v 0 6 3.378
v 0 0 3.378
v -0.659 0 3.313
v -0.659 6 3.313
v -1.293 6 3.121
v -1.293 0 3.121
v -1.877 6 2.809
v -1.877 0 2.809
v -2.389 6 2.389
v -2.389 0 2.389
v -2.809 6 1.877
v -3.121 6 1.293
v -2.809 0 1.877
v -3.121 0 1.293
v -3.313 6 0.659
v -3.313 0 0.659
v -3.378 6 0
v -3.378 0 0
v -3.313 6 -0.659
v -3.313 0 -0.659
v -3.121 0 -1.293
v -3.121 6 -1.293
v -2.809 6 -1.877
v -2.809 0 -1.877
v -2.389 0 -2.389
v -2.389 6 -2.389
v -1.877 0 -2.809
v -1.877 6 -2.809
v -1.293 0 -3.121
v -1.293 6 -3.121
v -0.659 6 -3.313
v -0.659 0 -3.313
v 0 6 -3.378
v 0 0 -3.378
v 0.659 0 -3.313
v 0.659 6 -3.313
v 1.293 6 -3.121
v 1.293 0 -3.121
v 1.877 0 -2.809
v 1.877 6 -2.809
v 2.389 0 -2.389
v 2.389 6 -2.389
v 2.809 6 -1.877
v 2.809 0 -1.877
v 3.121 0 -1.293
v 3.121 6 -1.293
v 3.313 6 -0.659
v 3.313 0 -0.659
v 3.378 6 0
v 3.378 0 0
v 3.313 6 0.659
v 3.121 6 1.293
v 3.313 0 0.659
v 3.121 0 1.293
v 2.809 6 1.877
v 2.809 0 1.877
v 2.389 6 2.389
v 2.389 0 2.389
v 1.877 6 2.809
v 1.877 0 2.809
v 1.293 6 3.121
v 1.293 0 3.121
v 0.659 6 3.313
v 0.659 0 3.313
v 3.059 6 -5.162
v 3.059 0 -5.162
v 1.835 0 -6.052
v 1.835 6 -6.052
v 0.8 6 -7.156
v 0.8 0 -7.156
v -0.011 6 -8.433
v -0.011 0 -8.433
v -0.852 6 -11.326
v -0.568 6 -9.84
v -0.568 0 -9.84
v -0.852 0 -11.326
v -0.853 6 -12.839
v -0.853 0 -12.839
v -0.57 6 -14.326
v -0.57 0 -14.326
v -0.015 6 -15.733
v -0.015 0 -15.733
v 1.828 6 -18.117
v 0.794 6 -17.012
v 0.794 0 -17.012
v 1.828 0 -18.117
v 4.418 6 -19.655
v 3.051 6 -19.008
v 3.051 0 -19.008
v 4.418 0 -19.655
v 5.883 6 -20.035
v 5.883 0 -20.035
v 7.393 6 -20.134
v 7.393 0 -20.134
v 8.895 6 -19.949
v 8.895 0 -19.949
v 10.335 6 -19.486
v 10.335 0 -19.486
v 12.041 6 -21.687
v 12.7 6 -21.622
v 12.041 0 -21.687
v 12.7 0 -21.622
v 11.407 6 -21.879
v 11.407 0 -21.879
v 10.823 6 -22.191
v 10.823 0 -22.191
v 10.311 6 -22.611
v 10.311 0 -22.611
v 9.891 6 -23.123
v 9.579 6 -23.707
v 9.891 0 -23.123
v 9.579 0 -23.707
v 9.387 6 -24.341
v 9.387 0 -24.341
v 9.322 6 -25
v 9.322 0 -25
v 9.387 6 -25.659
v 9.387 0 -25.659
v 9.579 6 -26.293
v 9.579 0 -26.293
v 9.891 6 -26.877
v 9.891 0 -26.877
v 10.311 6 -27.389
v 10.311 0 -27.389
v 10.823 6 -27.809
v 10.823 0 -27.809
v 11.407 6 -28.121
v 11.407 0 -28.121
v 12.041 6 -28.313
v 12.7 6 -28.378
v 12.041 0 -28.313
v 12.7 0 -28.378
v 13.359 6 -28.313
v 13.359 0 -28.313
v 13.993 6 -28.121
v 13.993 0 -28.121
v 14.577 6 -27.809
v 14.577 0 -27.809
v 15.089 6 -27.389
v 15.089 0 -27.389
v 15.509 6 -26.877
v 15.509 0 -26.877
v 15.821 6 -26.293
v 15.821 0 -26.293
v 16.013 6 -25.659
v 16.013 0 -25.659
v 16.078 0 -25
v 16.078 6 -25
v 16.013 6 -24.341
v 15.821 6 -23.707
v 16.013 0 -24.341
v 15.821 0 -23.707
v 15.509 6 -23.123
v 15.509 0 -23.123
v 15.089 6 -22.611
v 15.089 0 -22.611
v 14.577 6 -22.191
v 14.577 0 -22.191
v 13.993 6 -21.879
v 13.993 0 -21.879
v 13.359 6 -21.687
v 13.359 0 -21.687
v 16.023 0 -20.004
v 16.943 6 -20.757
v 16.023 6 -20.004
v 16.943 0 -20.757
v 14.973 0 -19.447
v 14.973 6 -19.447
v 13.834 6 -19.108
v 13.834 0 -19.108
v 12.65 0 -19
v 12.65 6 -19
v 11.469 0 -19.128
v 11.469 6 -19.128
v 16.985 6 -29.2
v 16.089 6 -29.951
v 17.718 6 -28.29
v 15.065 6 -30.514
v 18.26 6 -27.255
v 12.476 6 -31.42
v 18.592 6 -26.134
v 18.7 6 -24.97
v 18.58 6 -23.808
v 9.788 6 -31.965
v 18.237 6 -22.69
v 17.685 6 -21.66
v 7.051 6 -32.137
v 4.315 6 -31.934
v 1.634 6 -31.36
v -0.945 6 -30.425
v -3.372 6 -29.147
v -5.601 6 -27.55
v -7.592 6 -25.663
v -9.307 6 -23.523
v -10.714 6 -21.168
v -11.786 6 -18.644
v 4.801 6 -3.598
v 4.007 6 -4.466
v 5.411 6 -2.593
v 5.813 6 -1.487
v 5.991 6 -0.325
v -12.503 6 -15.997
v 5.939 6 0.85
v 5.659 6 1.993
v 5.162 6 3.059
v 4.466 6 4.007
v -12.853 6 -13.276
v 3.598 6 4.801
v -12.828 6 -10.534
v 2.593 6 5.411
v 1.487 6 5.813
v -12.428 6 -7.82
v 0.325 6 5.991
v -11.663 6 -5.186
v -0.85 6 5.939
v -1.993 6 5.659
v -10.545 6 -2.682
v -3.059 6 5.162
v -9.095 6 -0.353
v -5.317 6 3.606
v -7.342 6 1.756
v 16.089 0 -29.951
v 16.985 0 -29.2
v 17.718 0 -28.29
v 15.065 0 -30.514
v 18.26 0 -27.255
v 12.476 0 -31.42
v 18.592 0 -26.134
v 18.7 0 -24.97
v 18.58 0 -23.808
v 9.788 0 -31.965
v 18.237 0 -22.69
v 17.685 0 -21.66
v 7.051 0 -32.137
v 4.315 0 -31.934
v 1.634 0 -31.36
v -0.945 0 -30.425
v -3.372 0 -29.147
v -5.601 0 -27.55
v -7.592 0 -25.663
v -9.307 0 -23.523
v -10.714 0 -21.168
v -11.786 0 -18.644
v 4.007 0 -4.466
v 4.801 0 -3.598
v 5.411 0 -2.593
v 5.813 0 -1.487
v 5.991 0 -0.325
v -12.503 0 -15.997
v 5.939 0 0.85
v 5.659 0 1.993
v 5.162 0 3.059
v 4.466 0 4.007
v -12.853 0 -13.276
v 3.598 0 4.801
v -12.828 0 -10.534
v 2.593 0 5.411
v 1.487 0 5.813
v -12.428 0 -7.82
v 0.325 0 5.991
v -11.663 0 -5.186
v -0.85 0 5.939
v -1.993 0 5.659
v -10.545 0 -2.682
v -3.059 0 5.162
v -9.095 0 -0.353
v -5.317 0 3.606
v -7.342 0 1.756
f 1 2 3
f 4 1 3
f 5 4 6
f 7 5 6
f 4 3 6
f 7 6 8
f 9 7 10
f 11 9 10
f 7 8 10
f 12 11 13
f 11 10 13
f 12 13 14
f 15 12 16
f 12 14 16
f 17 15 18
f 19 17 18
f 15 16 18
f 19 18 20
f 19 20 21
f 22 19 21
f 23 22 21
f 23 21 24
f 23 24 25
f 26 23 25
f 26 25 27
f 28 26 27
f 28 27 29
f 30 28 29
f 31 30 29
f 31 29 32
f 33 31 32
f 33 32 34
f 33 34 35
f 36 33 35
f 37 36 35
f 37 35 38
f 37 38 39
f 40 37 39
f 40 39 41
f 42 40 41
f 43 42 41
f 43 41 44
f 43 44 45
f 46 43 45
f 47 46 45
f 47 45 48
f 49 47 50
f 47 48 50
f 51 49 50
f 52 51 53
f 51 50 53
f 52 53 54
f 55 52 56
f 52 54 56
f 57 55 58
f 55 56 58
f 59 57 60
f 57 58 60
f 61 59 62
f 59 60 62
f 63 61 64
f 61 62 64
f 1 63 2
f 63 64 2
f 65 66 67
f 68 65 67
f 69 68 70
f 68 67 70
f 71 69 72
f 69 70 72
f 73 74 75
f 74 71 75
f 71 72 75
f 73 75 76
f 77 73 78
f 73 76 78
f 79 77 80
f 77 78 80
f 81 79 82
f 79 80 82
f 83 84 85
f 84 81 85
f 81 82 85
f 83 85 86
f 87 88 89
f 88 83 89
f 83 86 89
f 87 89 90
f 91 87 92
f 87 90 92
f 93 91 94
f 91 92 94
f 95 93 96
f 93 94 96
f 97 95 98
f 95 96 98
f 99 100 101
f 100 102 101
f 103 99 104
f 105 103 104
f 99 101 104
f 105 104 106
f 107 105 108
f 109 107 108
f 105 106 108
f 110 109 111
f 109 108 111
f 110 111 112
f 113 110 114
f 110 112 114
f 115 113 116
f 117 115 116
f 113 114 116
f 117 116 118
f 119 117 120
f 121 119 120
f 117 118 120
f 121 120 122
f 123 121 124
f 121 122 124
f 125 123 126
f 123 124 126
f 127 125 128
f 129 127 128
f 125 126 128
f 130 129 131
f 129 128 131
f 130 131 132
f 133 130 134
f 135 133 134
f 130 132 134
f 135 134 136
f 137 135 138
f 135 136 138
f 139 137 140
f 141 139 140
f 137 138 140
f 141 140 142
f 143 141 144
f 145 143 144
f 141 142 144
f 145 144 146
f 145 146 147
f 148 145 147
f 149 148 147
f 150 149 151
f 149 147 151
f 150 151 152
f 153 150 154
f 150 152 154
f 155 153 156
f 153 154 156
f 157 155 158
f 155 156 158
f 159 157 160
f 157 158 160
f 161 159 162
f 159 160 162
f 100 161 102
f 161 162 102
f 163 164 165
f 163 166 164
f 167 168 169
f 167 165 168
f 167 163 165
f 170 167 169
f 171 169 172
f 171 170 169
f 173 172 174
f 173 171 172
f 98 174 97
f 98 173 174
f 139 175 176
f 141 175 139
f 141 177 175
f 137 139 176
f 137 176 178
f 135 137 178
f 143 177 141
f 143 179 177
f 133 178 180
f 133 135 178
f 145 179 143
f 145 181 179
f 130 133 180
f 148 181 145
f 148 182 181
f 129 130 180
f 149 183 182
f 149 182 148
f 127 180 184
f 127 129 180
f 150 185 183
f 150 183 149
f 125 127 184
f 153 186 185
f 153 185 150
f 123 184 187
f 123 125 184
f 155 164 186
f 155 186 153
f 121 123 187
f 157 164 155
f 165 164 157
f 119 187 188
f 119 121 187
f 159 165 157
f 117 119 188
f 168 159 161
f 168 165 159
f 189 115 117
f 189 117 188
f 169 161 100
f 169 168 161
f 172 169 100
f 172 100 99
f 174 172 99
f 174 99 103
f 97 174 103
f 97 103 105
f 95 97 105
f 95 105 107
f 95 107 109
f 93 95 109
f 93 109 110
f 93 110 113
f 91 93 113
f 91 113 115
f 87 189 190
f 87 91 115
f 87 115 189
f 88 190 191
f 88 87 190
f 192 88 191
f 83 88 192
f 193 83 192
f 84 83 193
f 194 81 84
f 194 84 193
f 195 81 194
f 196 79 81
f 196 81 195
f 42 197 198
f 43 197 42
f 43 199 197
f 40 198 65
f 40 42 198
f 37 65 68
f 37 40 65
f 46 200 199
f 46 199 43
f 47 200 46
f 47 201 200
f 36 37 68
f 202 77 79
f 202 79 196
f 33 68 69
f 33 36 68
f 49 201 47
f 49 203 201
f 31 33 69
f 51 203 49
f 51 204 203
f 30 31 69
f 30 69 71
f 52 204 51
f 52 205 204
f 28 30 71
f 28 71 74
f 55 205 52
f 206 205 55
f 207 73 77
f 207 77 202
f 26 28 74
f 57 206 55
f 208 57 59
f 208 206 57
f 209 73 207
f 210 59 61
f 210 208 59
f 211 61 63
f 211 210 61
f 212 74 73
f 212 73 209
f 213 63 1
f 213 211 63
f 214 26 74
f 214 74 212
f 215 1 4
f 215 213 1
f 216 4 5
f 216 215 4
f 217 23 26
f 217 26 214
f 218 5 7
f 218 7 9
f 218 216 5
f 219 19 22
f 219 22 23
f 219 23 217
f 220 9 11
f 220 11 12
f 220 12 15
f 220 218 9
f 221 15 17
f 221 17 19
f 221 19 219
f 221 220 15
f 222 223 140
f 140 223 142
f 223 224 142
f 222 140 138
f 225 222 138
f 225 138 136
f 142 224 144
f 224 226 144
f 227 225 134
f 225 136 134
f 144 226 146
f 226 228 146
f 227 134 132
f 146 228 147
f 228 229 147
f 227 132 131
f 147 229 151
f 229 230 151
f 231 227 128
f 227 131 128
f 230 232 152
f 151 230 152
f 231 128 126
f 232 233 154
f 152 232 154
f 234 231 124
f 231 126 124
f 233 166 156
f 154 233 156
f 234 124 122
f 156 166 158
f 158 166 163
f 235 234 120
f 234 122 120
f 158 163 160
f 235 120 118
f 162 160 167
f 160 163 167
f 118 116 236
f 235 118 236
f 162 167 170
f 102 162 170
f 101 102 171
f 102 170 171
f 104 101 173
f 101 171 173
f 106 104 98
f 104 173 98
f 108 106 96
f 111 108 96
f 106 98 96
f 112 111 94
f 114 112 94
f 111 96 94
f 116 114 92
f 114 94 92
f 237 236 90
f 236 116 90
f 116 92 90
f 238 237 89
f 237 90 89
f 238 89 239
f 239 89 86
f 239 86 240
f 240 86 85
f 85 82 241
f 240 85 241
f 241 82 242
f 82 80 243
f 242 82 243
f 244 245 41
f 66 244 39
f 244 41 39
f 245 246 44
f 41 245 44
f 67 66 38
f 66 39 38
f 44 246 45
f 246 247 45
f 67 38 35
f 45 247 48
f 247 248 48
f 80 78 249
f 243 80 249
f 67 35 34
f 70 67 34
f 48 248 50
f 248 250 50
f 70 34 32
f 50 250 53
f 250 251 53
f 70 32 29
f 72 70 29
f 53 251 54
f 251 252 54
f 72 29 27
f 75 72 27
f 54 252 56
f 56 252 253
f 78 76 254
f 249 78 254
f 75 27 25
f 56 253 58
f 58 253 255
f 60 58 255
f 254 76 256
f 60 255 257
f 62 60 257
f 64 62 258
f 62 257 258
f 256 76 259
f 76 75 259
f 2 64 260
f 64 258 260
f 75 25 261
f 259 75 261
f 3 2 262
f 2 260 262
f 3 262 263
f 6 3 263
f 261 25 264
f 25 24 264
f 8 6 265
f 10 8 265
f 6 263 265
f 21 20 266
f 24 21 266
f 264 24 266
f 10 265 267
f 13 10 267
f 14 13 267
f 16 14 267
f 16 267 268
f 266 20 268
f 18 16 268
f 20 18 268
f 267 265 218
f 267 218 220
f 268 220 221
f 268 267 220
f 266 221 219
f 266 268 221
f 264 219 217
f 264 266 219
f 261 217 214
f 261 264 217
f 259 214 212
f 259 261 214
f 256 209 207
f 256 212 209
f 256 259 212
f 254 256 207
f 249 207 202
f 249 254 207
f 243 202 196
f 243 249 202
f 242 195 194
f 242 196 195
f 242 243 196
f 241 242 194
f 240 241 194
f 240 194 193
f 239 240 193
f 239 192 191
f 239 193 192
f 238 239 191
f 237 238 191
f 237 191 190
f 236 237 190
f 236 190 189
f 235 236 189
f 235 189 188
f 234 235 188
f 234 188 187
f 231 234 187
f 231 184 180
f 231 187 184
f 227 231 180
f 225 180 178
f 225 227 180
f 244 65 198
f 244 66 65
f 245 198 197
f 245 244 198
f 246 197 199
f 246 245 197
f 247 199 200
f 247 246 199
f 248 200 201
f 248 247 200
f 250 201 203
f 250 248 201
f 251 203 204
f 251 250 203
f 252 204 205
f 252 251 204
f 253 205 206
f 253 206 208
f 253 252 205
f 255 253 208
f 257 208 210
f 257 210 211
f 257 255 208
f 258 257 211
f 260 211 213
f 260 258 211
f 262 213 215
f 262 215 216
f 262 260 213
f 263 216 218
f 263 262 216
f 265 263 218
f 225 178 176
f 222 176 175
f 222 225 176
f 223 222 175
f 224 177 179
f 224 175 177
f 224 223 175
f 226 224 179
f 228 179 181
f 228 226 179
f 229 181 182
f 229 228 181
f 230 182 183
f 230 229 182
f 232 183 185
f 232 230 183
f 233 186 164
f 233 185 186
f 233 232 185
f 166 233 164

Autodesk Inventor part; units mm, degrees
ref_plane "YZ Plane" through (0, 0, 0) normal (1, 0, 0) x (0, 1, 0)
ref_plane "XZ Plane" through (0, 0, 0) normal (0, 1, 0) x (-1, 0, 0)
ref_plane "XY Plane" through (0, 0, 0) normal (0, 0, 1) x (1, 0, 0)
sketch "Sketch1" plane through (0, 0, 0) normal (0, 1, 0) x (-1, 0, 0)
  arc A0 (6, 0) -> (-6, 0) centre (0, 0) ccw
  line L0 (6, 0) -> (6, -12.3)
  line L1 (4.2426, -16.5426) -> (-8.4574, -29.2426)
  line L2 (-16.9426, -20.7574) -> (-6, -9.8147)
  line L3 (-6, -9.8147) -> (-6, 0)
  arc A1 (-16.9426, -20.7574) -> (-8.4574, -29.2426) centre (-12.7, -25) ccw
  arc A2 (4.2426, -16.5426) -> (6, -12.3) centre (0, -12.3) ccw
  line L4 (0, 0) -> (-12.7, -25) construction
  circle A3 centre (0, 0) radius 6
  circle A4 centre (-12.7, -25) radius 6
  arc A5 (-10.3351, -19.4857) -> (-3.0586, -5.1619) centre (-7.1622, -12.0874) ccw
  arc A6 (-15.0649, -30.5143) -> (3.0586, 5.1619) centre (-7.1622, -12.0874) ccw
  point P0 (6, -14.7853)
  point P1 (-16.9426, -20.7574)
  point P2 (-15.0649, -30.5143)
  point P3 (3.0586, 5.1619)
  point P4 (-6, 0)
  dimension "d0" = 12
  dimension "d1" = 12.7
  dimension "d2" = 25
  dimension "d3" = 135
  dimension "d6" = 6
  dimension "d17" = 8.05
extrude "Extrusion1" add sketch "Sketch1" along normal blind 6 contours A3 A0 | A0 A6 A1 L1 A2 L0 | L0 A2 L1 A4 A5 A3 | A1 A4
sketch "Sketch2" plane through (0, 6, 0) normal (0, 1, 0) x (1, 0, 0)
  arc A0 (10.3351, 19.4857) -> (15.0649, 30.5143) centre (12.7, 25) ccw projected
  point P0 (0, 0)
  point P1 (16.9426, 20.7574)
  point P2 (8.4574, 29.2426)
hole "Hole1" at (0, 6, 0) at (12.7, 6, -25) direction (0, -1, 0) diameter 6.7564 depth 12.7 tip angle 118 clearance for "Flat Head Machine Screw (82)" size "1/4" standard "Ansi Unified Screw Threads"
properties part number "Tensioner2"
